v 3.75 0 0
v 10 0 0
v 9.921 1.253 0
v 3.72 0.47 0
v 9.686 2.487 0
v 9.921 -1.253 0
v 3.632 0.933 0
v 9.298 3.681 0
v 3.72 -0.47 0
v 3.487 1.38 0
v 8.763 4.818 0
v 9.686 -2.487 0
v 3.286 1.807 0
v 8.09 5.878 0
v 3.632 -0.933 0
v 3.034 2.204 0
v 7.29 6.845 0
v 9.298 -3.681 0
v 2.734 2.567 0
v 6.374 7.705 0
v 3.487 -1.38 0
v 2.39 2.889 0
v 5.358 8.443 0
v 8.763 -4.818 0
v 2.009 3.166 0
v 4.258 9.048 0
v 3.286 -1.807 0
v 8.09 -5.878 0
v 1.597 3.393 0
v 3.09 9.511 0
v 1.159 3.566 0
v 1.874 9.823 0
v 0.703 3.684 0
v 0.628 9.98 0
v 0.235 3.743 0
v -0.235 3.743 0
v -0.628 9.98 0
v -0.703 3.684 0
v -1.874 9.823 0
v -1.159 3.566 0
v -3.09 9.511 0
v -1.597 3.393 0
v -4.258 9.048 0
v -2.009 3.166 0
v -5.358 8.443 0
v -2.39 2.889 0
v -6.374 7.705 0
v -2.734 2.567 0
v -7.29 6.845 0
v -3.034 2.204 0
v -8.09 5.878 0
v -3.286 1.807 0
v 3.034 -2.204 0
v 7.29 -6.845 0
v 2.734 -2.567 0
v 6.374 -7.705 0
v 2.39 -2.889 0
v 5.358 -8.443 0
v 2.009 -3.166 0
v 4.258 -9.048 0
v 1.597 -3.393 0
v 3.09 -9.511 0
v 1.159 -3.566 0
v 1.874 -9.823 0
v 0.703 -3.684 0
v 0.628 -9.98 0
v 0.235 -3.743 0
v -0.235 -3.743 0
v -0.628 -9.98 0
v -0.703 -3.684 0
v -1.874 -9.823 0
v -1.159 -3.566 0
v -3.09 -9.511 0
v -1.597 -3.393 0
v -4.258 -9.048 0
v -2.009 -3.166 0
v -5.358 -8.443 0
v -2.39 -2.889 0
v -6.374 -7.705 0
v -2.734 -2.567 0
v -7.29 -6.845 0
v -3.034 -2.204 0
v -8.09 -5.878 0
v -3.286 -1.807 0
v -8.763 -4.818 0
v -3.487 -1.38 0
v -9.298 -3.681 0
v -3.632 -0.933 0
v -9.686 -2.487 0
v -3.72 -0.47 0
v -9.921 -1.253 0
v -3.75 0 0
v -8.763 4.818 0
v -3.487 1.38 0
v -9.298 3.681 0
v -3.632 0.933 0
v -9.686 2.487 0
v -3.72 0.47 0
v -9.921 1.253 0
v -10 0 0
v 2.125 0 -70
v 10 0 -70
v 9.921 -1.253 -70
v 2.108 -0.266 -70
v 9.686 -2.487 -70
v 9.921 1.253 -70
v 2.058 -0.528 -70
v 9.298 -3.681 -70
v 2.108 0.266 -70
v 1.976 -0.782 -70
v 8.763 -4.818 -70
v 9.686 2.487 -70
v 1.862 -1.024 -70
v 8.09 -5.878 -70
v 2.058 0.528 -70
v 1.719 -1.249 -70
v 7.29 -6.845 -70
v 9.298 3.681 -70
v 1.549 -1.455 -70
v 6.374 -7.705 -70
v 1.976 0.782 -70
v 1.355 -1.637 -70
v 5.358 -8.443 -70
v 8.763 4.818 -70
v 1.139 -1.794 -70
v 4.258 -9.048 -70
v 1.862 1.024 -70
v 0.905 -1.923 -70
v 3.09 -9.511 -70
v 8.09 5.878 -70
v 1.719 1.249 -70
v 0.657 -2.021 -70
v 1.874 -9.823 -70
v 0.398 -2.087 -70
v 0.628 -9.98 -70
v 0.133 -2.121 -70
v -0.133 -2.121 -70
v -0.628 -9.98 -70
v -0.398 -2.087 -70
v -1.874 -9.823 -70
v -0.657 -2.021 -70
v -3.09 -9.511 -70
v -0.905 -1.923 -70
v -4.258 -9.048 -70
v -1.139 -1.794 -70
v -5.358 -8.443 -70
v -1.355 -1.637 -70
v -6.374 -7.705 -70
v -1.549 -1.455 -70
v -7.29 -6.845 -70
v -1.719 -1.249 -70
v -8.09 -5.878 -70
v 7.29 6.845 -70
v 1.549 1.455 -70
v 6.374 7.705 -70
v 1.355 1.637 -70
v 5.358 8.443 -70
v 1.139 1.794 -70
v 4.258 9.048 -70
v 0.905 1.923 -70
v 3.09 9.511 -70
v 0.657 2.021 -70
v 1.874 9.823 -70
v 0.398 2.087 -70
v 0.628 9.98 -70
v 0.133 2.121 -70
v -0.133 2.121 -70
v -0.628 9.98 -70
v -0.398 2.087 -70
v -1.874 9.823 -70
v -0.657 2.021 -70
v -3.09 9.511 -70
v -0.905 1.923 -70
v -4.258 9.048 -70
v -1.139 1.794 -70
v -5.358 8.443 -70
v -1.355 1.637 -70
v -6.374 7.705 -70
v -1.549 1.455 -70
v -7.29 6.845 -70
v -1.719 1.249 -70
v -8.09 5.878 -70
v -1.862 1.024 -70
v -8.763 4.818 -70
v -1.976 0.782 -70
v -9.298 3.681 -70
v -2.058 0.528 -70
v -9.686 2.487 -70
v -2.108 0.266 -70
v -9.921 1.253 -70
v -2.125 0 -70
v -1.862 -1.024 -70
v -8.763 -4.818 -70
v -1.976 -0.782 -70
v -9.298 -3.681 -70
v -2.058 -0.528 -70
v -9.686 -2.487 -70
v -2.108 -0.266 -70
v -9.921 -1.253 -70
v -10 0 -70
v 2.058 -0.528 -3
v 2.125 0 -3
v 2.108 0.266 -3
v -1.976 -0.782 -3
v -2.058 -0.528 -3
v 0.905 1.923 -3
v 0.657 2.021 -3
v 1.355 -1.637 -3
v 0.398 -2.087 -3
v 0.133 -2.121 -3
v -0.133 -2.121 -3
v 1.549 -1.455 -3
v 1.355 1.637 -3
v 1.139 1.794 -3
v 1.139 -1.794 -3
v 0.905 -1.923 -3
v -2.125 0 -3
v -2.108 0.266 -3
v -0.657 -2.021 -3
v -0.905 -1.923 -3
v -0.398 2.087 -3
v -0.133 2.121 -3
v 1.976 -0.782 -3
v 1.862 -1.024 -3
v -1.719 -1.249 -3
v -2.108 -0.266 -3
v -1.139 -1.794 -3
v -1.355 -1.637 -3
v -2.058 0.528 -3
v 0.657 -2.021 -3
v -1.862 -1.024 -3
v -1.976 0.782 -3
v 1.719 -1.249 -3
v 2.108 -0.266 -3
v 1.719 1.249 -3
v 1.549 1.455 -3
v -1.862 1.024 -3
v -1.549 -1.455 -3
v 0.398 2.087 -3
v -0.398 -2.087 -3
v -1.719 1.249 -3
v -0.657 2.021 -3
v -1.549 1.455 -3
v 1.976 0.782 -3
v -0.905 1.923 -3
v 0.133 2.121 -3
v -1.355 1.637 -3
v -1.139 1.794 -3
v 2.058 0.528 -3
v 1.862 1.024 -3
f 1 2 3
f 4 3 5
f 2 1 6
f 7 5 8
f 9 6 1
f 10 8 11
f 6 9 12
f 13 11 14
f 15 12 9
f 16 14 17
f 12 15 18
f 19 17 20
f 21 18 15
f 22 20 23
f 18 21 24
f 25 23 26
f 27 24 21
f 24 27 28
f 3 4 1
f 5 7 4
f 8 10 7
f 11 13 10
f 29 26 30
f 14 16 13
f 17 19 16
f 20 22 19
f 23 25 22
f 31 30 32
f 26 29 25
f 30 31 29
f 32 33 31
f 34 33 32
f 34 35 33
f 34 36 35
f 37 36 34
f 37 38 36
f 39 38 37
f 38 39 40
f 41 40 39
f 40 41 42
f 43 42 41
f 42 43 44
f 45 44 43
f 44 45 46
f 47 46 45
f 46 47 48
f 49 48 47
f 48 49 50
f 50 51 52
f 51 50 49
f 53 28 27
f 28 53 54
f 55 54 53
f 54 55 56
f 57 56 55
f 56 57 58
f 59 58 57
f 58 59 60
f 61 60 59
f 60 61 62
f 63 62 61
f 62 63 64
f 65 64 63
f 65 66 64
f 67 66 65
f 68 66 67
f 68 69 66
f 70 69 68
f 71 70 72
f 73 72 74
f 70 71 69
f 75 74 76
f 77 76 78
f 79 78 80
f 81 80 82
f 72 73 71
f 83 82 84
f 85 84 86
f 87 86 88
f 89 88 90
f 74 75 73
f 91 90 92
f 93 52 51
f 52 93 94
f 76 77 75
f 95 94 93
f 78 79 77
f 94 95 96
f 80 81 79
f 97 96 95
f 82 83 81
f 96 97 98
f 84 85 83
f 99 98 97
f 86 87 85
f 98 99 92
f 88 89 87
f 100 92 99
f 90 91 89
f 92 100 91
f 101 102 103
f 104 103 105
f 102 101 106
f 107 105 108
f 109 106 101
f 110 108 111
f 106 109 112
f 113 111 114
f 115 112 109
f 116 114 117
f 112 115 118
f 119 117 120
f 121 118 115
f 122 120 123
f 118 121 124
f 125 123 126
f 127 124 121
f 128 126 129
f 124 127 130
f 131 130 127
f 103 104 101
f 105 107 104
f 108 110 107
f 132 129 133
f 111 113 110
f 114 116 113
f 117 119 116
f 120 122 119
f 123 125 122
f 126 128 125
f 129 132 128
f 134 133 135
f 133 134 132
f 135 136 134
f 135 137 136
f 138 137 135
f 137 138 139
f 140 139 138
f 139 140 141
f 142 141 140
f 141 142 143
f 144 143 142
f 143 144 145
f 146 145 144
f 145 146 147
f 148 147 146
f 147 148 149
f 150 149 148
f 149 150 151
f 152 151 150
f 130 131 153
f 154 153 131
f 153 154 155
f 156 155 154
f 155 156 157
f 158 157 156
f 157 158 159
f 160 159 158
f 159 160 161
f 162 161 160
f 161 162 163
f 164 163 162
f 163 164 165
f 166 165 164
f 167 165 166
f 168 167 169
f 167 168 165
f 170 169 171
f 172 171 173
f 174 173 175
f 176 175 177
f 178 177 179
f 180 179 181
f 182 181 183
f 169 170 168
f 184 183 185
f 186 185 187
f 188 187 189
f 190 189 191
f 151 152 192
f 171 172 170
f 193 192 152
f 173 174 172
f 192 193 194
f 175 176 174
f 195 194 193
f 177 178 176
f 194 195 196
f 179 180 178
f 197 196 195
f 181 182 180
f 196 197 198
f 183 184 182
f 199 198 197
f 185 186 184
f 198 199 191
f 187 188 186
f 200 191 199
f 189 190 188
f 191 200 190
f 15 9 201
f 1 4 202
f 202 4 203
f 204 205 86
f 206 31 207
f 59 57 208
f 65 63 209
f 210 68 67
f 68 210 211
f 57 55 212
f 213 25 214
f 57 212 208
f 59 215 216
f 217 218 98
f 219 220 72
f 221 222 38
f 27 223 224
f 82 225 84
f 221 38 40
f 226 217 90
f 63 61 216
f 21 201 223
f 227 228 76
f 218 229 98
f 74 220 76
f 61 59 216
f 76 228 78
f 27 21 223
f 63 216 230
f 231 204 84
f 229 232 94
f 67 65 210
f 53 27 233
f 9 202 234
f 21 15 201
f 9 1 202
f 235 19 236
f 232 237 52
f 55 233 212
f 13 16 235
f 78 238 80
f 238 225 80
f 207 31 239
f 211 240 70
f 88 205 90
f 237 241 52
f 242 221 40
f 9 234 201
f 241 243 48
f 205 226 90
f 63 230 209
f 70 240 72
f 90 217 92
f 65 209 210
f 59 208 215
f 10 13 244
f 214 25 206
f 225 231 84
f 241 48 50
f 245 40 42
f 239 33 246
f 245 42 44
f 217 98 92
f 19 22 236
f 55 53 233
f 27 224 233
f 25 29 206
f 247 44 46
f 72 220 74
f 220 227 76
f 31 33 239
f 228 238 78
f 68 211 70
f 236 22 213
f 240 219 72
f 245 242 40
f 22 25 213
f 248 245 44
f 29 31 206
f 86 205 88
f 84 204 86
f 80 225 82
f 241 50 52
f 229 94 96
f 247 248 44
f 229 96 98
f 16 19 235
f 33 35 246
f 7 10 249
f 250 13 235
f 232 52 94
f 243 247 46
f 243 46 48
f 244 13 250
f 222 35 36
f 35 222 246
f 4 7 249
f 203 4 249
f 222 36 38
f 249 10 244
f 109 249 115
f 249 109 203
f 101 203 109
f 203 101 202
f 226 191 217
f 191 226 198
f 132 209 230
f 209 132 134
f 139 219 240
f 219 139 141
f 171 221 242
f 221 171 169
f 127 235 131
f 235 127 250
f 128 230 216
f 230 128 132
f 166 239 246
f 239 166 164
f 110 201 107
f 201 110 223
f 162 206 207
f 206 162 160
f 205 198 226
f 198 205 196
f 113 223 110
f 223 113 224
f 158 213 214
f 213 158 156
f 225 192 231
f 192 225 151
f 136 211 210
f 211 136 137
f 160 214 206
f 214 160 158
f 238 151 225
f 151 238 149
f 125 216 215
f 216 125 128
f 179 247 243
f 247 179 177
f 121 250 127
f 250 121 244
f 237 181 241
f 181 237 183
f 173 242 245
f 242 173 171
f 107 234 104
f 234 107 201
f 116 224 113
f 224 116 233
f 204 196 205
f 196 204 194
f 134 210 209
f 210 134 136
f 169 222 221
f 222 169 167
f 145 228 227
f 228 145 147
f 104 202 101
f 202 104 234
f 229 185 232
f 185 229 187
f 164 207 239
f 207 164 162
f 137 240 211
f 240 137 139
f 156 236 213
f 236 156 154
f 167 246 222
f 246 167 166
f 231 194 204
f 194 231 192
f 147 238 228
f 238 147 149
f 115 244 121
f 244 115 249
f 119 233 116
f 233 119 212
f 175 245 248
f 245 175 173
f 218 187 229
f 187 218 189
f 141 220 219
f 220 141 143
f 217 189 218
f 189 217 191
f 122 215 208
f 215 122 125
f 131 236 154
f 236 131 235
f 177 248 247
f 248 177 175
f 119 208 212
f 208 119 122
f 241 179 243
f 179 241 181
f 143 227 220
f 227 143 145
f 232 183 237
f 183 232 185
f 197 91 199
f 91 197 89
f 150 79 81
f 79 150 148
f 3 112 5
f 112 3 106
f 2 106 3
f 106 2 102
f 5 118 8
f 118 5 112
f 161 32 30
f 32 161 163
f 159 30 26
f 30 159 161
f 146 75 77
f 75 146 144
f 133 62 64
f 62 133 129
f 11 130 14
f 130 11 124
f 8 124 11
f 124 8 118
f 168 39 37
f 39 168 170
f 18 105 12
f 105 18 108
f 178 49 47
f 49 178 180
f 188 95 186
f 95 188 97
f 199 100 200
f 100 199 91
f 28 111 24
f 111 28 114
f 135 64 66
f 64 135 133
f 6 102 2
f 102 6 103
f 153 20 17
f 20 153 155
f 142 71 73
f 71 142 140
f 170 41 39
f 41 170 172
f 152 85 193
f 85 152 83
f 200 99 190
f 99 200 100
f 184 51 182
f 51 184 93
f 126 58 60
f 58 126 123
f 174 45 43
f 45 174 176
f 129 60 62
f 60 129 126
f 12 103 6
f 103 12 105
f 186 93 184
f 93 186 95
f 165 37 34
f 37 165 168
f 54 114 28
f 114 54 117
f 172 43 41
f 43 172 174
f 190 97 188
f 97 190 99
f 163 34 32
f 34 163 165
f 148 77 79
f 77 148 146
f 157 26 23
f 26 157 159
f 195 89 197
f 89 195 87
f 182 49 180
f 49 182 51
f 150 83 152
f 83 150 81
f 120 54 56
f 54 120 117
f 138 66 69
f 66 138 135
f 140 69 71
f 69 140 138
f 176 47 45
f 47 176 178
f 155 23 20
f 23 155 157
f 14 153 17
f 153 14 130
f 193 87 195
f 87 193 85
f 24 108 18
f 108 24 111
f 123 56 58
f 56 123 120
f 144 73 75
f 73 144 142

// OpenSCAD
$fn = 50;


difference() {
	union() {
		translate(v = [0, 0, -70.0000000000]) {
			cylinder(h = 70, r = 10.0000000000);
		}
		cylinder(h = 0, r = 16.0000000000);
	}
	union() {
		translate(v = [0, 0, 0]) {
			rotate(a = [0, 0, 0]) {
				difference() {
					union() {
						#translate(v = [0, 0, -70.0000000000]) {
							cylinder(h = 70, r = 2.0000000000);
						}
						#translate(v = [0, 0, -3]) {
							cylinder(h = 3, r1 = 2.1250000000, r2 = 3.7500000000);
						}
						#translate(v = [0, 0, -70.0000000000]) {
							cylinder(h = 70, r = 2.1250000000);
						}
						#translate(v = [0, 0, -70.0000000000]) {
							cylinder(h = 70, r = 2.0000000000);
						}
					}
					union();
				}
			}
		}
	}
}
